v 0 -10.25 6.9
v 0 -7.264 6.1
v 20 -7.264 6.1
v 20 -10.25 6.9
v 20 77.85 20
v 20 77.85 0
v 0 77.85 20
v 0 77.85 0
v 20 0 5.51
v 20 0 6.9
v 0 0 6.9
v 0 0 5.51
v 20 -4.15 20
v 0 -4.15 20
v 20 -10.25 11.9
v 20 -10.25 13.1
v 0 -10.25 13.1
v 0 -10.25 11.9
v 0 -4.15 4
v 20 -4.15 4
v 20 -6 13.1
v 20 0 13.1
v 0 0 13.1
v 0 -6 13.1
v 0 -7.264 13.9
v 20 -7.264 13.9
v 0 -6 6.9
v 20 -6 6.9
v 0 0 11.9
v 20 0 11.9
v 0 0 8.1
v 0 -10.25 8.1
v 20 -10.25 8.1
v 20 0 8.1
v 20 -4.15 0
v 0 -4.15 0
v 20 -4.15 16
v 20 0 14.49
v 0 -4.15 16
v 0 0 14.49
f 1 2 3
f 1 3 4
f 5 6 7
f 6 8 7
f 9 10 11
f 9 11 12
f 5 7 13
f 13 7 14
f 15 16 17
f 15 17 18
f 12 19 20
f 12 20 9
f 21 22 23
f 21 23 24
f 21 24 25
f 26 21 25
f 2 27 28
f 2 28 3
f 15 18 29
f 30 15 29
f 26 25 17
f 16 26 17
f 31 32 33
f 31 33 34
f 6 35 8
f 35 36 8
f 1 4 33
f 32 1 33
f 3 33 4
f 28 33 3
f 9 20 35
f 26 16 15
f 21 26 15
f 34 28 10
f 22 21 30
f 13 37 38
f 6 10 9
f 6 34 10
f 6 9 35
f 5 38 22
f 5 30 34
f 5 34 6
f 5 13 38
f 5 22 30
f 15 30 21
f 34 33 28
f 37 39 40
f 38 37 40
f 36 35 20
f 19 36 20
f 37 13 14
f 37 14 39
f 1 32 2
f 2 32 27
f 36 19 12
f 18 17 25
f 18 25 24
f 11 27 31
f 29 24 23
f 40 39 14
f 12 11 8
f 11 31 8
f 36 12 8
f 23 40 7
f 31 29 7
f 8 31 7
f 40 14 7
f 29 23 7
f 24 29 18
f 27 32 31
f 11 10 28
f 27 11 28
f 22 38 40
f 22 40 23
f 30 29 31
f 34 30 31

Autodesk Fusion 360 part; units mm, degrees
sketch "Sketch1" plane through (0, 0, 0) normal (1, 0, 0) x (0, 1, 0)
  line L0 (77.85, 0) -> (77.85, 20)
  line L1 (0, 10) -> (-14.9603, 10) construction
  line L2 (-4.15, 16) -> (0, 14.4895)
  line L3 (-7.2644, 13.9) -> (-10.25, 13.1)
  line L4 (0, 6.9) -> (-6, 6.9)
  line L5 (0, 20) -> (-4.15, 20)
  line L6 (0, 0) -> (77.85, 0)
  line L7 (-10.25, 6.9) -> (-10.25, 8.1)
  line L8 (-6, 6.9) -> (-7.2644, 6.1)
  line L9 (-10.25, 8.1) -> (0, 8.1)
  line L10 (-4.15, 4) -> (0, 5.5105)
  line L11 (-10.25, 13.1) -> (-10.25, 11.9)
  line L12 (-7.2644, 6.1) -> (-10.25, 6.9)
  line L13 (0, 10) -> (-14.9603, 10) construction
  line L14 (-4.15, 20) -> (-4.15, 16)
  line L15 (-4.15, 0) -> (-4.15, 4)
  line L16 (0, 20) -> (0, 0)
  line L17 (-6, 13.1) -> (-7.2644, 13.9)
  line L18 (0, 0) -> (-4.15, 0)
  line L19 (77.85, 0) -> (77.85, 20)
  line L20 (-10.25, 11.9) -> (0, 11.9)
  line L21 (0, 13.1) -> (-6, 13.1)
  line L22 (77.85, 20) -> (0, 20)
  dimension "d1" = 20
  dimension "d2" = 6
  dimension "d3" = 1.85
  dimension "d4" = 4
  dimension "d5" = 1.2
  dimension "d6" = 4.25
  dimension "d7" = 3.1
  dimension "d8" = 70
  dimension "d9" = 0.8
  dimension "d10" = 105
  dimension "d14" = 20
  dimension "d21" = 82
extrude "Extrude1" add sketch "Sketch1" along normal blind 20
